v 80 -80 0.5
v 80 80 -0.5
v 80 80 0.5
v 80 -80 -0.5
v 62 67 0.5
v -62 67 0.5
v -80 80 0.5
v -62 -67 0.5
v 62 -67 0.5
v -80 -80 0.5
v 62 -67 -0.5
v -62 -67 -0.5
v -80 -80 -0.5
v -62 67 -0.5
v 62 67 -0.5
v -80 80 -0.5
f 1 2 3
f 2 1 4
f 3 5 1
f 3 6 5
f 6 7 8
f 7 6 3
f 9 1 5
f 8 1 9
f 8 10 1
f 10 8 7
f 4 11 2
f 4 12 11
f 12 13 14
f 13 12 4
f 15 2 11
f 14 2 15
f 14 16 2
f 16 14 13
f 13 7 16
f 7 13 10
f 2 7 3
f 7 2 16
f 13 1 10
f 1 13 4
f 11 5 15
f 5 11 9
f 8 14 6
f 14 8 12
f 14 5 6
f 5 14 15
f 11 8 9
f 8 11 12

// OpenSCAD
inner=145;
outer=160;
terc=[138, 148];

difference() {
	cube([outer, outer, 1], center=true);
	cube([terc[0]-7*2, terc[1]-7*2, 10], center=true);
}
